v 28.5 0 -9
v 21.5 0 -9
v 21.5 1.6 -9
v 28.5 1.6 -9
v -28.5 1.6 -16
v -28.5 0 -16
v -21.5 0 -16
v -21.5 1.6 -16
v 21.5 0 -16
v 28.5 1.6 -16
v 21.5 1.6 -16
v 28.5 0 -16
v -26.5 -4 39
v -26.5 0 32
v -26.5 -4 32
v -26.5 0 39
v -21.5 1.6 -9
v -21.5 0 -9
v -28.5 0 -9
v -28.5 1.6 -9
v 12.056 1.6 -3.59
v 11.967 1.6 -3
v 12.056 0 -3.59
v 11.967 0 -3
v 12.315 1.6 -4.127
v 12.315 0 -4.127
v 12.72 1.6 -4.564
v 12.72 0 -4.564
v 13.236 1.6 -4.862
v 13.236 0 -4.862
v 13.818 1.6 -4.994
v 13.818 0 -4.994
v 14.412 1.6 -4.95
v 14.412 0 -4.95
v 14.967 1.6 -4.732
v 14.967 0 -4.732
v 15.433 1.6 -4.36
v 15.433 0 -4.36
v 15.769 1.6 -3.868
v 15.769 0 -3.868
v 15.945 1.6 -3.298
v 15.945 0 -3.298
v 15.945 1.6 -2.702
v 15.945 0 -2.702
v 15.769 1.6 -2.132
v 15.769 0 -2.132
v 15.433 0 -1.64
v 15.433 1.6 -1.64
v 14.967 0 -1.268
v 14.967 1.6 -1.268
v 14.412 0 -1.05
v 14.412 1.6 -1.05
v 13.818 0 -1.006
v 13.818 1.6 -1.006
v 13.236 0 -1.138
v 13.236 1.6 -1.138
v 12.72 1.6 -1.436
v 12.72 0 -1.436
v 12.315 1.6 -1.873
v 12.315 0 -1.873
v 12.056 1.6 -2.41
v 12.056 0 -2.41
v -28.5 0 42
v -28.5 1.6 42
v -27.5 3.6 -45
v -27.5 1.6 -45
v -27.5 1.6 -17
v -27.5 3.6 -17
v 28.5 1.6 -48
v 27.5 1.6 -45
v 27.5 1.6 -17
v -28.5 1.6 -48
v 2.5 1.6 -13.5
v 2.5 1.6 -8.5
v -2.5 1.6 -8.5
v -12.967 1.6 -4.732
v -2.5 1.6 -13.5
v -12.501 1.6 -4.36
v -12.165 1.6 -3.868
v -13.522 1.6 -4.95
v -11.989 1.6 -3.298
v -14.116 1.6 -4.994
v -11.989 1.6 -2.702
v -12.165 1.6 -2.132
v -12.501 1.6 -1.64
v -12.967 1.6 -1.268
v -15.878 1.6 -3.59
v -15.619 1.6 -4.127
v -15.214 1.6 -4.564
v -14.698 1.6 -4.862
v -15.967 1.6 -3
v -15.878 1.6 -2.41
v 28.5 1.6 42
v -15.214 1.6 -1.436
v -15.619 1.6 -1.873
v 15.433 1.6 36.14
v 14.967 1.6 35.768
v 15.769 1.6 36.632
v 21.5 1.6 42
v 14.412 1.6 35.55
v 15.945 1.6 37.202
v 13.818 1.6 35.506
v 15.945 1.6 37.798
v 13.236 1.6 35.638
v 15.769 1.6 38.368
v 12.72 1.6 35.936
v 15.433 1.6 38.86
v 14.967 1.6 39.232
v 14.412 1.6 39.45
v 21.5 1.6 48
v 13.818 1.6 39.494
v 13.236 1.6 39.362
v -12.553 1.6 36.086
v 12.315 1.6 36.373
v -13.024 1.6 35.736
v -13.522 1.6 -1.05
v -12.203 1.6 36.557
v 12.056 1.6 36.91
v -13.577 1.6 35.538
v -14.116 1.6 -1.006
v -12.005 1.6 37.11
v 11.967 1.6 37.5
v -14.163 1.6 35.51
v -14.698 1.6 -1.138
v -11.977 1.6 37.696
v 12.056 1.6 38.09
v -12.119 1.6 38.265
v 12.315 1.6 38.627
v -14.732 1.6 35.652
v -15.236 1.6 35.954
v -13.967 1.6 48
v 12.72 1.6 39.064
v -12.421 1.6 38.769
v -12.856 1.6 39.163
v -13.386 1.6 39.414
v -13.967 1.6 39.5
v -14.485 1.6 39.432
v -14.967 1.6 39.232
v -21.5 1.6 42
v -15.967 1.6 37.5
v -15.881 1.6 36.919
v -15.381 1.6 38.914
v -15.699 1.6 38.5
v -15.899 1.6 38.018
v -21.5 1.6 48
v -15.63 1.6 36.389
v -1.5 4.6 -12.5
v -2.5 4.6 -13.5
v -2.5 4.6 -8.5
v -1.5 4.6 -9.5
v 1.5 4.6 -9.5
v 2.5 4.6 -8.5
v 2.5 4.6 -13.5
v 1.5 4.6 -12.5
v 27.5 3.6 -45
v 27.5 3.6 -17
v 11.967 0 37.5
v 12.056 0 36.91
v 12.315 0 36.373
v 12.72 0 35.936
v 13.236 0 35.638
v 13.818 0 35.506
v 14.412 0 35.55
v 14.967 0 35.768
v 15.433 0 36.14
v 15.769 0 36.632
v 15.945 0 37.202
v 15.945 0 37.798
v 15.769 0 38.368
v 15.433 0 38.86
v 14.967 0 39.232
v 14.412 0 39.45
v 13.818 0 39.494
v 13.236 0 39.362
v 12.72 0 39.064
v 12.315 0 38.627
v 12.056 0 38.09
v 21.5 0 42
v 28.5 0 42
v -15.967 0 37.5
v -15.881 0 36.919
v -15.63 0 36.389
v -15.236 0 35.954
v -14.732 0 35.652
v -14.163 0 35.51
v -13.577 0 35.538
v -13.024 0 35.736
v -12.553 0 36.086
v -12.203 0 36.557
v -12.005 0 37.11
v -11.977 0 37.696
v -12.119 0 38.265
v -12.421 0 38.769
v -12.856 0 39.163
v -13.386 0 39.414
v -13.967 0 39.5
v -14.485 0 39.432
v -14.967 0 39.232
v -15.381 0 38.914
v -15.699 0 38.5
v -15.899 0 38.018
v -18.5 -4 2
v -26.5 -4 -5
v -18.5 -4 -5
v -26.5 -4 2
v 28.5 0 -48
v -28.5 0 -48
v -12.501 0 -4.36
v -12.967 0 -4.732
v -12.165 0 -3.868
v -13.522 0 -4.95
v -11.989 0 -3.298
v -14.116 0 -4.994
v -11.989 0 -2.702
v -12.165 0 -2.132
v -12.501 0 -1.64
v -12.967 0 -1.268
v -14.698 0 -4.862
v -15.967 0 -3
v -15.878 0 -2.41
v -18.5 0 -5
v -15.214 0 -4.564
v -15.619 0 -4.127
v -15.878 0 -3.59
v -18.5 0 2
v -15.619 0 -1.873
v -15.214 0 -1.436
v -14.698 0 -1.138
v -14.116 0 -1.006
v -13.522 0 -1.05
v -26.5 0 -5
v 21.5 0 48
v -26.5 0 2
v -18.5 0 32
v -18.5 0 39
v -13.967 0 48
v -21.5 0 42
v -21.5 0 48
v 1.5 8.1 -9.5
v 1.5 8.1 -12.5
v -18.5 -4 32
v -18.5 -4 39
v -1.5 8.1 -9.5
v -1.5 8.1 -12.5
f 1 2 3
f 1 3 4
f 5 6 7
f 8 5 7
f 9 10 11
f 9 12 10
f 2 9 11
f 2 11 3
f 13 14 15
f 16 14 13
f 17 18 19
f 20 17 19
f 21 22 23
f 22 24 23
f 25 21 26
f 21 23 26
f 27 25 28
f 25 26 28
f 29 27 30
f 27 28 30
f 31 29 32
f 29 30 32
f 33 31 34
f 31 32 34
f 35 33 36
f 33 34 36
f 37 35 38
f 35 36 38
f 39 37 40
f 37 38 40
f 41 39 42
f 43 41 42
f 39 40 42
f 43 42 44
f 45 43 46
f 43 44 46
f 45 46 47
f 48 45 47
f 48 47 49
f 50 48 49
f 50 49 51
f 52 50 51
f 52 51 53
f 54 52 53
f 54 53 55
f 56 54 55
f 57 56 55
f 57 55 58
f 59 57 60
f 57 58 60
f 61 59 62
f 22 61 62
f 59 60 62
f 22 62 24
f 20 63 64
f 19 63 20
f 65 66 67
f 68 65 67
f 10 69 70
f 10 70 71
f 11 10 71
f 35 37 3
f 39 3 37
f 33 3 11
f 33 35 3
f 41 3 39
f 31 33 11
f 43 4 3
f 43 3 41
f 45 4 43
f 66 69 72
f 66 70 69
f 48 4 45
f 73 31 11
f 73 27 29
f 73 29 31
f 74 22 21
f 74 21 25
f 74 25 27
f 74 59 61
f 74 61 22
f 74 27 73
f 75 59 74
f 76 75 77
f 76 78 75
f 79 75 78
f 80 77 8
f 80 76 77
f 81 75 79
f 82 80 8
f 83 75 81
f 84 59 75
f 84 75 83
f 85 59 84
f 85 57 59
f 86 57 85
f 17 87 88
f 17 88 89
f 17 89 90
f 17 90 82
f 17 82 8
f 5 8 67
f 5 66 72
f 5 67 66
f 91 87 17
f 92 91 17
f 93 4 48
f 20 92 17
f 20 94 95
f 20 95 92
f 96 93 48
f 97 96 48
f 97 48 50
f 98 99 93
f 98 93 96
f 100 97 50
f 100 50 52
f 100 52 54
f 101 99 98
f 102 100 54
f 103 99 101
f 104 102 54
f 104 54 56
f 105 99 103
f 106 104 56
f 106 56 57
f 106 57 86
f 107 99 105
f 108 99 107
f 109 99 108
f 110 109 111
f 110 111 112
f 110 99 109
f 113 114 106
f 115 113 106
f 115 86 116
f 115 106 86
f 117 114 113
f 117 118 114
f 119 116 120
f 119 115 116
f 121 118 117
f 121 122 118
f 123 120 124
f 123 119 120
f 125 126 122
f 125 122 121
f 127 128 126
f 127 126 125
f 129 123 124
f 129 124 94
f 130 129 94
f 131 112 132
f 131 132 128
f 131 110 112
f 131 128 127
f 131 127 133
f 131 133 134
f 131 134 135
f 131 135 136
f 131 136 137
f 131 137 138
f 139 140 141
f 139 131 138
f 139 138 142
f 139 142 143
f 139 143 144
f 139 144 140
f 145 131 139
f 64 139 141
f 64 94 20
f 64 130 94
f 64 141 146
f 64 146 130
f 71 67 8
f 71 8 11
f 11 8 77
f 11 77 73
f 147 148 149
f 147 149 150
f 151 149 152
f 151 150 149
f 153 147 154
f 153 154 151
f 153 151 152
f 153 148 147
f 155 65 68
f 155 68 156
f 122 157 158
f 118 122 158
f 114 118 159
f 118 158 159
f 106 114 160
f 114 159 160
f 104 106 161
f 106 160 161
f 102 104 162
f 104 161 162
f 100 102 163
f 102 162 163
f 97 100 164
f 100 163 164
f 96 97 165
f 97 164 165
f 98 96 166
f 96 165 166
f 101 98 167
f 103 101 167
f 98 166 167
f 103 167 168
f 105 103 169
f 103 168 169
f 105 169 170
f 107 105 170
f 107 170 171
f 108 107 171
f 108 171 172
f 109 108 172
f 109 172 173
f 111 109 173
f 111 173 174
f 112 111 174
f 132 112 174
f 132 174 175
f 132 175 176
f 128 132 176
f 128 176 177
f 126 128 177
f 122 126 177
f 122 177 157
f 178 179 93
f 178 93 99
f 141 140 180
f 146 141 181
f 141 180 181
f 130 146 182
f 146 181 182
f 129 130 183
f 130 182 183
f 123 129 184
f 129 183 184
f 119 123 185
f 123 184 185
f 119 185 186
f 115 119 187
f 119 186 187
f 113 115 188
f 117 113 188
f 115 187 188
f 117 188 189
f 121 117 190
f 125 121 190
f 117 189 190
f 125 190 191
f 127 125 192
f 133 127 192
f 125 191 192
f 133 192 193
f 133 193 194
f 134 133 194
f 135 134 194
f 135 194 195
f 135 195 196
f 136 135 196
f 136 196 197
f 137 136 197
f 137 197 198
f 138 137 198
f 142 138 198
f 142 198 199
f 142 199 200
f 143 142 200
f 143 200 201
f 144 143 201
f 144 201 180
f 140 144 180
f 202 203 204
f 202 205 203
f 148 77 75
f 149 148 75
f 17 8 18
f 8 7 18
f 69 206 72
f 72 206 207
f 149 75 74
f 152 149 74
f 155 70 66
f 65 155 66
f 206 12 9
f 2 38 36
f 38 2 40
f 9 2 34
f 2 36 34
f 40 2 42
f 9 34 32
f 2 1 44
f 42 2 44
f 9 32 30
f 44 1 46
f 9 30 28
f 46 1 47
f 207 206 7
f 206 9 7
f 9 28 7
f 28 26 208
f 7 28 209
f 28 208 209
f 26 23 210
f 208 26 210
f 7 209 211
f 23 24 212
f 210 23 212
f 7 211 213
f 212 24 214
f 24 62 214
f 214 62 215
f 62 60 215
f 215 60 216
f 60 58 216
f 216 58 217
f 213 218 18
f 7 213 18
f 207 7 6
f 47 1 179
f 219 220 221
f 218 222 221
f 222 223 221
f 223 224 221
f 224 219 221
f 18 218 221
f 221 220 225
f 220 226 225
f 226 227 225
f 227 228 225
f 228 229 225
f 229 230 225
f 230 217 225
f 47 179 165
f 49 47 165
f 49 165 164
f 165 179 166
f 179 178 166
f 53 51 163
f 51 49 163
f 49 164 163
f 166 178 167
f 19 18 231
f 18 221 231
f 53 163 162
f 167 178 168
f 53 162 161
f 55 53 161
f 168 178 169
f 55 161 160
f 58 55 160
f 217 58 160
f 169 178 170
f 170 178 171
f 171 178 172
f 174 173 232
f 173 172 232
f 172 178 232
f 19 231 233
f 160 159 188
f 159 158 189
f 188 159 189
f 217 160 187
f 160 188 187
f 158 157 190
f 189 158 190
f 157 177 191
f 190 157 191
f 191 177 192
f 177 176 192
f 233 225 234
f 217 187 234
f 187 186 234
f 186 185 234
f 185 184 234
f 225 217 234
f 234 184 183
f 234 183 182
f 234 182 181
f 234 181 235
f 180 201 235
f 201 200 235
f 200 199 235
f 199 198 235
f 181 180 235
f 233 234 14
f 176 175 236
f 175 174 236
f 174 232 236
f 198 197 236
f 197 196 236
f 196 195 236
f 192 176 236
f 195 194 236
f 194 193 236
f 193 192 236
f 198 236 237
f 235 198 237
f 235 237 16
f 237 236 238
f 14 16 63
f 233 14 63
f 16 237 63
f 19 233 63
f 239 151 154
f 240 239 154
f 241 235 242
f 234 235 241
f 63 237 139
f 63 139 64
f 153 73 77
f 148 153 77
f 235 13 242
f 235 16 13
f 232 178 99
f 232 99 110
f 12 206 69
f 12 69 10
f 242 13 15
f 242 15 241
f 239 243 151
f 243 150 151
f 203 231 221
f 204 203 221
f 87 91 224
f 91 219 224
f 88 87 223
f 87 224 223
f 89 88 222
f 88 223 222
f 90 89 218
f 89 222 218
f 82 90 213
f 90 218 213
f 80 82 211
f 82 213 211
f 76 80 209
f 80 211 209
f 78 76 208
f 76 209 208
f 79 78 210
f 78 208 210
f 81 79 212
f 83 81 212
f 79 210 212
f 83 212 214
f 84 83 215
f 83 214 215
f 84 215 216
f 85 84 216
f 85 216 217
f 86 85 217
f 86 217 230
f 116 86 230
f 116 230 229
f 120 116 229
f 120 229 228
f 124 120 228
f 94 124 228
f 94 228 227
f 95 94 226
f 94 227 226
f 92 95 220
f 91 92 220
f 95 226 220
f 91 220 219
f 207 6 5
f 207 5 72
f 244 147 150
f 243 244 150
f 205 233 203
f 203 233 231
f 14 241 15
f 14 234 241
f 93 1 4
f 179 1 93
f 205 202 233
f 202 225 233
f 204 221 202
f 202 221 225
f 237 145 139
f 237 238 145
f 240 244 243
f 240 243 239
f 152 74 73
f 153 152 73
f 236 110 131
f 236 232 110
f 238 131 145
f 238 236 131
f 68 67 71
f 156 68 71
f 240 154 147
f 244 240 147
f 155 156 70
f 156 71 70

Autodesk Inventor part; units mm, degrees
ref_plane "YZ Plane" through (0, 0, 0) normal (1, 0, 0) x (0, 1, 0)
ref_plane "XZ Plane" through (0, 0, 0) normal (0, 1, 0) x (-1, 0, 0)
ref_plane "XY Plane" through (0, 0, 0) normal (0, 0, 1) x (1, 0, 0)
sketch "Sketch1" plane through (0, 0, 0) normal (0, 1, 0) x (-1, 0, 0)
  line L0 (-28.5, -48) -> (28.5, -48)
  line L1 (28.5, 48) -> (-28.5, -48) construction
  line L2 (-28.5, 48) -> (28.5, -48) construction
  line L3 (-28.5, -48) -> (-28.5, -16)
  line L4 (-28.5, -16) -> (-21.5, -16)
  line L5 (-21.5, -16) -> (-21.5, -9)
  line L6 (-21.5, -9) -> (-28.5, -9)
  line L7 (0, -48) -> (0, 48)
  line L8 (21.5, -16) -> (21.5, -9)
  line L9 (28.5, -16) -> (21.5, -16)
  line L10 (21.5, -9) -> (28.5, -9)
  line L11 (-28.5, -9) -> (-28.5, 16.5)
  line L12 (-28.5, 16.5) -> (28.5, 16.5)
  line L13 (21.5, 42) -> (28.5, 42)
  line L14 (-28.5, -48) -> (-13.5, -48)
  line L15 (-13.5, -48) -> (-13.5, -3)
  line L16 (28.5, 42) -> (28.5, -9)
  line L17 (28.5, -16) -> (28.5, -48)
  line L18 (-28.5, 16.5) -> (-28.5, 42)
  line L19 (-28.5, -3) -> (-13.967, -3)
  circle A0 centre (-13.967, -3) radius 2
  line L20 (-28.5, 37) -> (-13.967, 37)
  circle A1 centre (13.967, -3) radius 2
  line L21 (21.5, 48) -> (21.5, 42)
  line L22 (-28.5, 42) -> (-21.5, 42)
  line L23 (-21.5, 42) -> (-21.5, 48)
  line L24 (-21.5, 48) -> (21.5, 48)
  line L25 (-13.967, 48) -> (-13.967, 37.5)
  line L26 (-13.967, 48) -> (-3.467, 48) construction
  line L27 (13.967, 48) -> (13.967, 37.5)
  circle A2 centre (13.967, 37.5) radius 2
  circle A3 centre (-13.967, 37.5) radius 2
  point P0 (0, 0)
  dimension "d0" = 57
  dimension "d1" = 96
  dimension "d2" = 32
  dimension "d3" = 7
  dimension "d4" = 7
  dimension "d5" = 25.5
  dimension "d7" = 45
  dimension "d40" = 14.533
  dimension "d41" = 4
  dimension "d42" = 14.533
  dimension "d50" = 14.533
  dimension "d57" = 7
  dimension "d59" = 10.5
  dimension "d60" = 90
  dimension "d61" = 10.5
  dimension "d62" = 4
  dimension "d63" = 4
extrude "Extrusion2" add sketch "Sketch1" along normal blind 1.6 contours L3 L4 L5 L6 L11 L19 A0 L15 L0 | L15 A0 L19 L11 L12 L7 L0 | L7 L12 L16 L10 L8 L9 L17 L0 | A0 | L12 L18 L20 A3 L25 L24 L7 | A2 | L7 L24 L21 L13 L16 L12 | L25 A3 L20 L18 L22 L23 L24 | A3 | A1
sketch "Sketch3" plane through (0, 1.6, 0) normal (0, 1, 0) x (1, 0, 0)
  line L0 (28.5, 48) -> (-28.5, 48) projected
  line L1 (28.5, 48) -> (27.5, 48)
  line L2 (27.5, 48) -> (27.5, 45)
  line L3 (27.5, 45) -> (28.5, 45)
  line L4 (28.5, 45) -> (28.5, 48)
  line L5 (27.5, 45) -> (-27.5, 45)
  line L6 (-27.5, 45) -> (-27.5, 17)
  line L7 (-27.5, 17) -> (27.5, 17)
  line L8 (27.5, 17) -> (27.5, 45)
  point P0 (0, 0)
  dimension "d16" = 1
  dimension "d17" = 3
  dimension "d18" = 55
  dimension "d19" = 28
extrude "Extrusion3" add sketch "Sketch3" along normal blind 2 contours L8 L7 L6 L5
sketch "Sketch4" plane through (0, 1.6, 0) normal (0, 1, 0) x (1, 0, 0)
  line L0 (-2.5, 8.5) -> (2.5, 8.5)
  line L1 (2.5, 8.5) -> (2.5, 13.5)
  line L2 (2.5, 13.5) -> (-2.5, 13.5)
  line L3 (-2.5, 13.5) -> (-2.5, 8.5)
  line L4 (-2.5, 8.5) -> (2.5, 13.5) construction
  line L5 (2.5, 8.5) -> (-2.5, 13.5) construction
  point P0 (0, 0)
  point P1 (-21.5, -46.725)
  point P2 (21.5, -46.725)
extrude "Extrusion4" add sketch "Sketch4" along normal blind 3
sketch "Sketch5" plane through (0, 4.6, 0) normal (0, 1, 0) x (1, 0, 0)
  line L0 (-2.5, 8.5) -> (-2.5, 13.5) projected
  line L1 (-2.5, 13.5) -> (0, 13.5)
  line L2 (0, 13.5) -> (0, 11)
  line L3 (0, 11) -> (-2.5, 11)
  line L4 (-2.5, 11) -> (-2.5, 13.5)
  line L5 (-5, 6) -> (5, 6)
  line L6 (5, 6) -> (5, 16)
  line L7 (5, 16) -> (-5, 16)
  line L8 (-5, 16) -> (-5, 6)
  line L9 (-5, 6) -> (5, 16) construction
  line L10 (5, 6) -> (-5, 16) construction
  point P0 (0, 0)
  dimension "d64" = 10
  dimension "d65" = 10
sketch "Sketch6" plane through (0, 4.6, 0) normal (0, 1, 0) x (1, 0, 0)
  line L0 (2.5, 8.5) -> (2.5, 13.5) projected
  line L1 (2.5, 13.5) -> (0, 13.5)
  line L2 (0, 13.5) -> (0, 11)
  line L3 (0, 11) -> (2.5, 11)
  line L4 (2.5, 11) -> (2.5, 13.5)
  line L5 (-1.5, 9.5) -> (1.5, 9.5)
  line L6 (1.5, 9.5) -> (1.5, 12.5)
  line L7 (1.5, 12.5) -> (-1.5, 12.5)
  line L8 (-1.5, 12.5) -> (-1.5, 9.5)
  line L9 (-1.5, 9.5) -> (1.5, 12.5) construction
  line L10 (1.5, 9.5) -> (-1.5, 12.5) construction
  point P0 (0, 0)
  dimension "d29" = 3
  dimension "d30" = 3
extrude "Extrusion5" add sketch "Sketch6" along normal blind 3.5 contours L6 L5 L8 L7 L2 L3 | L3 L2 L7 L6
sketch "Sketch7" plane through (0, 0, 0) normal (0, -1, 0) x (1, 0, 0)
  line L0 (28.5, -48) -> (-28.5, -48) projected
  line L1 (-28.5, -48) -> (-26.5, -48)
  line L2 (-26.5, -48) -> (-26.5, -5)
  line L3 (-26.5, -5) -> (-28.5, -5)
  line L4 (-28.5, -5) -> (-28.5, -48)
  line L5 (-26.5, -5) -> (-18.5, -5)
  line L6 (-18.5, -5) -> (-18.5, 2)
  line L7 (-18.5, 2) -> (-26.5, 2)
  line L8 (-26.5, 2) -> (-26.5, -5)
  line L9 (-26.5, 2) -> (-26.5, 17)
  line L10 (-26.5, 17) -> (0, 17)
  line L11 (-18.5, 32) -> (-26.5, 32)
  line L12 (-18.5, 39) -> (-18.5, 32)
  line L13 (-26.5, 39) -> (-18.5, 39)
  line L14 (-26.5, 32) -> (-26.5, 39)
  point P0 (0, 0)
  dimension "d33" = 2
  dimension "d34" = 43
  dimension "d35" = 8
  dimension "d36" = 7
  dimension "d37" = 15
extrude "Extrusion6" add sketch "Sketch7" along normal blind 4 contours L8 L7 L6 L5 | L11 L14 L13 L12
extrude "Extrusion7" cut sketch "Sketch1" along normal blind 10 contours A0
extrude "Extrusion8" cut sketch "Sketch1" along normal blind 10 contours A1
extrude "Extrusion9" cut sketch "Sketch1" along normal blind 10 contours A2 | A3
properties part number "Cheapstat"
